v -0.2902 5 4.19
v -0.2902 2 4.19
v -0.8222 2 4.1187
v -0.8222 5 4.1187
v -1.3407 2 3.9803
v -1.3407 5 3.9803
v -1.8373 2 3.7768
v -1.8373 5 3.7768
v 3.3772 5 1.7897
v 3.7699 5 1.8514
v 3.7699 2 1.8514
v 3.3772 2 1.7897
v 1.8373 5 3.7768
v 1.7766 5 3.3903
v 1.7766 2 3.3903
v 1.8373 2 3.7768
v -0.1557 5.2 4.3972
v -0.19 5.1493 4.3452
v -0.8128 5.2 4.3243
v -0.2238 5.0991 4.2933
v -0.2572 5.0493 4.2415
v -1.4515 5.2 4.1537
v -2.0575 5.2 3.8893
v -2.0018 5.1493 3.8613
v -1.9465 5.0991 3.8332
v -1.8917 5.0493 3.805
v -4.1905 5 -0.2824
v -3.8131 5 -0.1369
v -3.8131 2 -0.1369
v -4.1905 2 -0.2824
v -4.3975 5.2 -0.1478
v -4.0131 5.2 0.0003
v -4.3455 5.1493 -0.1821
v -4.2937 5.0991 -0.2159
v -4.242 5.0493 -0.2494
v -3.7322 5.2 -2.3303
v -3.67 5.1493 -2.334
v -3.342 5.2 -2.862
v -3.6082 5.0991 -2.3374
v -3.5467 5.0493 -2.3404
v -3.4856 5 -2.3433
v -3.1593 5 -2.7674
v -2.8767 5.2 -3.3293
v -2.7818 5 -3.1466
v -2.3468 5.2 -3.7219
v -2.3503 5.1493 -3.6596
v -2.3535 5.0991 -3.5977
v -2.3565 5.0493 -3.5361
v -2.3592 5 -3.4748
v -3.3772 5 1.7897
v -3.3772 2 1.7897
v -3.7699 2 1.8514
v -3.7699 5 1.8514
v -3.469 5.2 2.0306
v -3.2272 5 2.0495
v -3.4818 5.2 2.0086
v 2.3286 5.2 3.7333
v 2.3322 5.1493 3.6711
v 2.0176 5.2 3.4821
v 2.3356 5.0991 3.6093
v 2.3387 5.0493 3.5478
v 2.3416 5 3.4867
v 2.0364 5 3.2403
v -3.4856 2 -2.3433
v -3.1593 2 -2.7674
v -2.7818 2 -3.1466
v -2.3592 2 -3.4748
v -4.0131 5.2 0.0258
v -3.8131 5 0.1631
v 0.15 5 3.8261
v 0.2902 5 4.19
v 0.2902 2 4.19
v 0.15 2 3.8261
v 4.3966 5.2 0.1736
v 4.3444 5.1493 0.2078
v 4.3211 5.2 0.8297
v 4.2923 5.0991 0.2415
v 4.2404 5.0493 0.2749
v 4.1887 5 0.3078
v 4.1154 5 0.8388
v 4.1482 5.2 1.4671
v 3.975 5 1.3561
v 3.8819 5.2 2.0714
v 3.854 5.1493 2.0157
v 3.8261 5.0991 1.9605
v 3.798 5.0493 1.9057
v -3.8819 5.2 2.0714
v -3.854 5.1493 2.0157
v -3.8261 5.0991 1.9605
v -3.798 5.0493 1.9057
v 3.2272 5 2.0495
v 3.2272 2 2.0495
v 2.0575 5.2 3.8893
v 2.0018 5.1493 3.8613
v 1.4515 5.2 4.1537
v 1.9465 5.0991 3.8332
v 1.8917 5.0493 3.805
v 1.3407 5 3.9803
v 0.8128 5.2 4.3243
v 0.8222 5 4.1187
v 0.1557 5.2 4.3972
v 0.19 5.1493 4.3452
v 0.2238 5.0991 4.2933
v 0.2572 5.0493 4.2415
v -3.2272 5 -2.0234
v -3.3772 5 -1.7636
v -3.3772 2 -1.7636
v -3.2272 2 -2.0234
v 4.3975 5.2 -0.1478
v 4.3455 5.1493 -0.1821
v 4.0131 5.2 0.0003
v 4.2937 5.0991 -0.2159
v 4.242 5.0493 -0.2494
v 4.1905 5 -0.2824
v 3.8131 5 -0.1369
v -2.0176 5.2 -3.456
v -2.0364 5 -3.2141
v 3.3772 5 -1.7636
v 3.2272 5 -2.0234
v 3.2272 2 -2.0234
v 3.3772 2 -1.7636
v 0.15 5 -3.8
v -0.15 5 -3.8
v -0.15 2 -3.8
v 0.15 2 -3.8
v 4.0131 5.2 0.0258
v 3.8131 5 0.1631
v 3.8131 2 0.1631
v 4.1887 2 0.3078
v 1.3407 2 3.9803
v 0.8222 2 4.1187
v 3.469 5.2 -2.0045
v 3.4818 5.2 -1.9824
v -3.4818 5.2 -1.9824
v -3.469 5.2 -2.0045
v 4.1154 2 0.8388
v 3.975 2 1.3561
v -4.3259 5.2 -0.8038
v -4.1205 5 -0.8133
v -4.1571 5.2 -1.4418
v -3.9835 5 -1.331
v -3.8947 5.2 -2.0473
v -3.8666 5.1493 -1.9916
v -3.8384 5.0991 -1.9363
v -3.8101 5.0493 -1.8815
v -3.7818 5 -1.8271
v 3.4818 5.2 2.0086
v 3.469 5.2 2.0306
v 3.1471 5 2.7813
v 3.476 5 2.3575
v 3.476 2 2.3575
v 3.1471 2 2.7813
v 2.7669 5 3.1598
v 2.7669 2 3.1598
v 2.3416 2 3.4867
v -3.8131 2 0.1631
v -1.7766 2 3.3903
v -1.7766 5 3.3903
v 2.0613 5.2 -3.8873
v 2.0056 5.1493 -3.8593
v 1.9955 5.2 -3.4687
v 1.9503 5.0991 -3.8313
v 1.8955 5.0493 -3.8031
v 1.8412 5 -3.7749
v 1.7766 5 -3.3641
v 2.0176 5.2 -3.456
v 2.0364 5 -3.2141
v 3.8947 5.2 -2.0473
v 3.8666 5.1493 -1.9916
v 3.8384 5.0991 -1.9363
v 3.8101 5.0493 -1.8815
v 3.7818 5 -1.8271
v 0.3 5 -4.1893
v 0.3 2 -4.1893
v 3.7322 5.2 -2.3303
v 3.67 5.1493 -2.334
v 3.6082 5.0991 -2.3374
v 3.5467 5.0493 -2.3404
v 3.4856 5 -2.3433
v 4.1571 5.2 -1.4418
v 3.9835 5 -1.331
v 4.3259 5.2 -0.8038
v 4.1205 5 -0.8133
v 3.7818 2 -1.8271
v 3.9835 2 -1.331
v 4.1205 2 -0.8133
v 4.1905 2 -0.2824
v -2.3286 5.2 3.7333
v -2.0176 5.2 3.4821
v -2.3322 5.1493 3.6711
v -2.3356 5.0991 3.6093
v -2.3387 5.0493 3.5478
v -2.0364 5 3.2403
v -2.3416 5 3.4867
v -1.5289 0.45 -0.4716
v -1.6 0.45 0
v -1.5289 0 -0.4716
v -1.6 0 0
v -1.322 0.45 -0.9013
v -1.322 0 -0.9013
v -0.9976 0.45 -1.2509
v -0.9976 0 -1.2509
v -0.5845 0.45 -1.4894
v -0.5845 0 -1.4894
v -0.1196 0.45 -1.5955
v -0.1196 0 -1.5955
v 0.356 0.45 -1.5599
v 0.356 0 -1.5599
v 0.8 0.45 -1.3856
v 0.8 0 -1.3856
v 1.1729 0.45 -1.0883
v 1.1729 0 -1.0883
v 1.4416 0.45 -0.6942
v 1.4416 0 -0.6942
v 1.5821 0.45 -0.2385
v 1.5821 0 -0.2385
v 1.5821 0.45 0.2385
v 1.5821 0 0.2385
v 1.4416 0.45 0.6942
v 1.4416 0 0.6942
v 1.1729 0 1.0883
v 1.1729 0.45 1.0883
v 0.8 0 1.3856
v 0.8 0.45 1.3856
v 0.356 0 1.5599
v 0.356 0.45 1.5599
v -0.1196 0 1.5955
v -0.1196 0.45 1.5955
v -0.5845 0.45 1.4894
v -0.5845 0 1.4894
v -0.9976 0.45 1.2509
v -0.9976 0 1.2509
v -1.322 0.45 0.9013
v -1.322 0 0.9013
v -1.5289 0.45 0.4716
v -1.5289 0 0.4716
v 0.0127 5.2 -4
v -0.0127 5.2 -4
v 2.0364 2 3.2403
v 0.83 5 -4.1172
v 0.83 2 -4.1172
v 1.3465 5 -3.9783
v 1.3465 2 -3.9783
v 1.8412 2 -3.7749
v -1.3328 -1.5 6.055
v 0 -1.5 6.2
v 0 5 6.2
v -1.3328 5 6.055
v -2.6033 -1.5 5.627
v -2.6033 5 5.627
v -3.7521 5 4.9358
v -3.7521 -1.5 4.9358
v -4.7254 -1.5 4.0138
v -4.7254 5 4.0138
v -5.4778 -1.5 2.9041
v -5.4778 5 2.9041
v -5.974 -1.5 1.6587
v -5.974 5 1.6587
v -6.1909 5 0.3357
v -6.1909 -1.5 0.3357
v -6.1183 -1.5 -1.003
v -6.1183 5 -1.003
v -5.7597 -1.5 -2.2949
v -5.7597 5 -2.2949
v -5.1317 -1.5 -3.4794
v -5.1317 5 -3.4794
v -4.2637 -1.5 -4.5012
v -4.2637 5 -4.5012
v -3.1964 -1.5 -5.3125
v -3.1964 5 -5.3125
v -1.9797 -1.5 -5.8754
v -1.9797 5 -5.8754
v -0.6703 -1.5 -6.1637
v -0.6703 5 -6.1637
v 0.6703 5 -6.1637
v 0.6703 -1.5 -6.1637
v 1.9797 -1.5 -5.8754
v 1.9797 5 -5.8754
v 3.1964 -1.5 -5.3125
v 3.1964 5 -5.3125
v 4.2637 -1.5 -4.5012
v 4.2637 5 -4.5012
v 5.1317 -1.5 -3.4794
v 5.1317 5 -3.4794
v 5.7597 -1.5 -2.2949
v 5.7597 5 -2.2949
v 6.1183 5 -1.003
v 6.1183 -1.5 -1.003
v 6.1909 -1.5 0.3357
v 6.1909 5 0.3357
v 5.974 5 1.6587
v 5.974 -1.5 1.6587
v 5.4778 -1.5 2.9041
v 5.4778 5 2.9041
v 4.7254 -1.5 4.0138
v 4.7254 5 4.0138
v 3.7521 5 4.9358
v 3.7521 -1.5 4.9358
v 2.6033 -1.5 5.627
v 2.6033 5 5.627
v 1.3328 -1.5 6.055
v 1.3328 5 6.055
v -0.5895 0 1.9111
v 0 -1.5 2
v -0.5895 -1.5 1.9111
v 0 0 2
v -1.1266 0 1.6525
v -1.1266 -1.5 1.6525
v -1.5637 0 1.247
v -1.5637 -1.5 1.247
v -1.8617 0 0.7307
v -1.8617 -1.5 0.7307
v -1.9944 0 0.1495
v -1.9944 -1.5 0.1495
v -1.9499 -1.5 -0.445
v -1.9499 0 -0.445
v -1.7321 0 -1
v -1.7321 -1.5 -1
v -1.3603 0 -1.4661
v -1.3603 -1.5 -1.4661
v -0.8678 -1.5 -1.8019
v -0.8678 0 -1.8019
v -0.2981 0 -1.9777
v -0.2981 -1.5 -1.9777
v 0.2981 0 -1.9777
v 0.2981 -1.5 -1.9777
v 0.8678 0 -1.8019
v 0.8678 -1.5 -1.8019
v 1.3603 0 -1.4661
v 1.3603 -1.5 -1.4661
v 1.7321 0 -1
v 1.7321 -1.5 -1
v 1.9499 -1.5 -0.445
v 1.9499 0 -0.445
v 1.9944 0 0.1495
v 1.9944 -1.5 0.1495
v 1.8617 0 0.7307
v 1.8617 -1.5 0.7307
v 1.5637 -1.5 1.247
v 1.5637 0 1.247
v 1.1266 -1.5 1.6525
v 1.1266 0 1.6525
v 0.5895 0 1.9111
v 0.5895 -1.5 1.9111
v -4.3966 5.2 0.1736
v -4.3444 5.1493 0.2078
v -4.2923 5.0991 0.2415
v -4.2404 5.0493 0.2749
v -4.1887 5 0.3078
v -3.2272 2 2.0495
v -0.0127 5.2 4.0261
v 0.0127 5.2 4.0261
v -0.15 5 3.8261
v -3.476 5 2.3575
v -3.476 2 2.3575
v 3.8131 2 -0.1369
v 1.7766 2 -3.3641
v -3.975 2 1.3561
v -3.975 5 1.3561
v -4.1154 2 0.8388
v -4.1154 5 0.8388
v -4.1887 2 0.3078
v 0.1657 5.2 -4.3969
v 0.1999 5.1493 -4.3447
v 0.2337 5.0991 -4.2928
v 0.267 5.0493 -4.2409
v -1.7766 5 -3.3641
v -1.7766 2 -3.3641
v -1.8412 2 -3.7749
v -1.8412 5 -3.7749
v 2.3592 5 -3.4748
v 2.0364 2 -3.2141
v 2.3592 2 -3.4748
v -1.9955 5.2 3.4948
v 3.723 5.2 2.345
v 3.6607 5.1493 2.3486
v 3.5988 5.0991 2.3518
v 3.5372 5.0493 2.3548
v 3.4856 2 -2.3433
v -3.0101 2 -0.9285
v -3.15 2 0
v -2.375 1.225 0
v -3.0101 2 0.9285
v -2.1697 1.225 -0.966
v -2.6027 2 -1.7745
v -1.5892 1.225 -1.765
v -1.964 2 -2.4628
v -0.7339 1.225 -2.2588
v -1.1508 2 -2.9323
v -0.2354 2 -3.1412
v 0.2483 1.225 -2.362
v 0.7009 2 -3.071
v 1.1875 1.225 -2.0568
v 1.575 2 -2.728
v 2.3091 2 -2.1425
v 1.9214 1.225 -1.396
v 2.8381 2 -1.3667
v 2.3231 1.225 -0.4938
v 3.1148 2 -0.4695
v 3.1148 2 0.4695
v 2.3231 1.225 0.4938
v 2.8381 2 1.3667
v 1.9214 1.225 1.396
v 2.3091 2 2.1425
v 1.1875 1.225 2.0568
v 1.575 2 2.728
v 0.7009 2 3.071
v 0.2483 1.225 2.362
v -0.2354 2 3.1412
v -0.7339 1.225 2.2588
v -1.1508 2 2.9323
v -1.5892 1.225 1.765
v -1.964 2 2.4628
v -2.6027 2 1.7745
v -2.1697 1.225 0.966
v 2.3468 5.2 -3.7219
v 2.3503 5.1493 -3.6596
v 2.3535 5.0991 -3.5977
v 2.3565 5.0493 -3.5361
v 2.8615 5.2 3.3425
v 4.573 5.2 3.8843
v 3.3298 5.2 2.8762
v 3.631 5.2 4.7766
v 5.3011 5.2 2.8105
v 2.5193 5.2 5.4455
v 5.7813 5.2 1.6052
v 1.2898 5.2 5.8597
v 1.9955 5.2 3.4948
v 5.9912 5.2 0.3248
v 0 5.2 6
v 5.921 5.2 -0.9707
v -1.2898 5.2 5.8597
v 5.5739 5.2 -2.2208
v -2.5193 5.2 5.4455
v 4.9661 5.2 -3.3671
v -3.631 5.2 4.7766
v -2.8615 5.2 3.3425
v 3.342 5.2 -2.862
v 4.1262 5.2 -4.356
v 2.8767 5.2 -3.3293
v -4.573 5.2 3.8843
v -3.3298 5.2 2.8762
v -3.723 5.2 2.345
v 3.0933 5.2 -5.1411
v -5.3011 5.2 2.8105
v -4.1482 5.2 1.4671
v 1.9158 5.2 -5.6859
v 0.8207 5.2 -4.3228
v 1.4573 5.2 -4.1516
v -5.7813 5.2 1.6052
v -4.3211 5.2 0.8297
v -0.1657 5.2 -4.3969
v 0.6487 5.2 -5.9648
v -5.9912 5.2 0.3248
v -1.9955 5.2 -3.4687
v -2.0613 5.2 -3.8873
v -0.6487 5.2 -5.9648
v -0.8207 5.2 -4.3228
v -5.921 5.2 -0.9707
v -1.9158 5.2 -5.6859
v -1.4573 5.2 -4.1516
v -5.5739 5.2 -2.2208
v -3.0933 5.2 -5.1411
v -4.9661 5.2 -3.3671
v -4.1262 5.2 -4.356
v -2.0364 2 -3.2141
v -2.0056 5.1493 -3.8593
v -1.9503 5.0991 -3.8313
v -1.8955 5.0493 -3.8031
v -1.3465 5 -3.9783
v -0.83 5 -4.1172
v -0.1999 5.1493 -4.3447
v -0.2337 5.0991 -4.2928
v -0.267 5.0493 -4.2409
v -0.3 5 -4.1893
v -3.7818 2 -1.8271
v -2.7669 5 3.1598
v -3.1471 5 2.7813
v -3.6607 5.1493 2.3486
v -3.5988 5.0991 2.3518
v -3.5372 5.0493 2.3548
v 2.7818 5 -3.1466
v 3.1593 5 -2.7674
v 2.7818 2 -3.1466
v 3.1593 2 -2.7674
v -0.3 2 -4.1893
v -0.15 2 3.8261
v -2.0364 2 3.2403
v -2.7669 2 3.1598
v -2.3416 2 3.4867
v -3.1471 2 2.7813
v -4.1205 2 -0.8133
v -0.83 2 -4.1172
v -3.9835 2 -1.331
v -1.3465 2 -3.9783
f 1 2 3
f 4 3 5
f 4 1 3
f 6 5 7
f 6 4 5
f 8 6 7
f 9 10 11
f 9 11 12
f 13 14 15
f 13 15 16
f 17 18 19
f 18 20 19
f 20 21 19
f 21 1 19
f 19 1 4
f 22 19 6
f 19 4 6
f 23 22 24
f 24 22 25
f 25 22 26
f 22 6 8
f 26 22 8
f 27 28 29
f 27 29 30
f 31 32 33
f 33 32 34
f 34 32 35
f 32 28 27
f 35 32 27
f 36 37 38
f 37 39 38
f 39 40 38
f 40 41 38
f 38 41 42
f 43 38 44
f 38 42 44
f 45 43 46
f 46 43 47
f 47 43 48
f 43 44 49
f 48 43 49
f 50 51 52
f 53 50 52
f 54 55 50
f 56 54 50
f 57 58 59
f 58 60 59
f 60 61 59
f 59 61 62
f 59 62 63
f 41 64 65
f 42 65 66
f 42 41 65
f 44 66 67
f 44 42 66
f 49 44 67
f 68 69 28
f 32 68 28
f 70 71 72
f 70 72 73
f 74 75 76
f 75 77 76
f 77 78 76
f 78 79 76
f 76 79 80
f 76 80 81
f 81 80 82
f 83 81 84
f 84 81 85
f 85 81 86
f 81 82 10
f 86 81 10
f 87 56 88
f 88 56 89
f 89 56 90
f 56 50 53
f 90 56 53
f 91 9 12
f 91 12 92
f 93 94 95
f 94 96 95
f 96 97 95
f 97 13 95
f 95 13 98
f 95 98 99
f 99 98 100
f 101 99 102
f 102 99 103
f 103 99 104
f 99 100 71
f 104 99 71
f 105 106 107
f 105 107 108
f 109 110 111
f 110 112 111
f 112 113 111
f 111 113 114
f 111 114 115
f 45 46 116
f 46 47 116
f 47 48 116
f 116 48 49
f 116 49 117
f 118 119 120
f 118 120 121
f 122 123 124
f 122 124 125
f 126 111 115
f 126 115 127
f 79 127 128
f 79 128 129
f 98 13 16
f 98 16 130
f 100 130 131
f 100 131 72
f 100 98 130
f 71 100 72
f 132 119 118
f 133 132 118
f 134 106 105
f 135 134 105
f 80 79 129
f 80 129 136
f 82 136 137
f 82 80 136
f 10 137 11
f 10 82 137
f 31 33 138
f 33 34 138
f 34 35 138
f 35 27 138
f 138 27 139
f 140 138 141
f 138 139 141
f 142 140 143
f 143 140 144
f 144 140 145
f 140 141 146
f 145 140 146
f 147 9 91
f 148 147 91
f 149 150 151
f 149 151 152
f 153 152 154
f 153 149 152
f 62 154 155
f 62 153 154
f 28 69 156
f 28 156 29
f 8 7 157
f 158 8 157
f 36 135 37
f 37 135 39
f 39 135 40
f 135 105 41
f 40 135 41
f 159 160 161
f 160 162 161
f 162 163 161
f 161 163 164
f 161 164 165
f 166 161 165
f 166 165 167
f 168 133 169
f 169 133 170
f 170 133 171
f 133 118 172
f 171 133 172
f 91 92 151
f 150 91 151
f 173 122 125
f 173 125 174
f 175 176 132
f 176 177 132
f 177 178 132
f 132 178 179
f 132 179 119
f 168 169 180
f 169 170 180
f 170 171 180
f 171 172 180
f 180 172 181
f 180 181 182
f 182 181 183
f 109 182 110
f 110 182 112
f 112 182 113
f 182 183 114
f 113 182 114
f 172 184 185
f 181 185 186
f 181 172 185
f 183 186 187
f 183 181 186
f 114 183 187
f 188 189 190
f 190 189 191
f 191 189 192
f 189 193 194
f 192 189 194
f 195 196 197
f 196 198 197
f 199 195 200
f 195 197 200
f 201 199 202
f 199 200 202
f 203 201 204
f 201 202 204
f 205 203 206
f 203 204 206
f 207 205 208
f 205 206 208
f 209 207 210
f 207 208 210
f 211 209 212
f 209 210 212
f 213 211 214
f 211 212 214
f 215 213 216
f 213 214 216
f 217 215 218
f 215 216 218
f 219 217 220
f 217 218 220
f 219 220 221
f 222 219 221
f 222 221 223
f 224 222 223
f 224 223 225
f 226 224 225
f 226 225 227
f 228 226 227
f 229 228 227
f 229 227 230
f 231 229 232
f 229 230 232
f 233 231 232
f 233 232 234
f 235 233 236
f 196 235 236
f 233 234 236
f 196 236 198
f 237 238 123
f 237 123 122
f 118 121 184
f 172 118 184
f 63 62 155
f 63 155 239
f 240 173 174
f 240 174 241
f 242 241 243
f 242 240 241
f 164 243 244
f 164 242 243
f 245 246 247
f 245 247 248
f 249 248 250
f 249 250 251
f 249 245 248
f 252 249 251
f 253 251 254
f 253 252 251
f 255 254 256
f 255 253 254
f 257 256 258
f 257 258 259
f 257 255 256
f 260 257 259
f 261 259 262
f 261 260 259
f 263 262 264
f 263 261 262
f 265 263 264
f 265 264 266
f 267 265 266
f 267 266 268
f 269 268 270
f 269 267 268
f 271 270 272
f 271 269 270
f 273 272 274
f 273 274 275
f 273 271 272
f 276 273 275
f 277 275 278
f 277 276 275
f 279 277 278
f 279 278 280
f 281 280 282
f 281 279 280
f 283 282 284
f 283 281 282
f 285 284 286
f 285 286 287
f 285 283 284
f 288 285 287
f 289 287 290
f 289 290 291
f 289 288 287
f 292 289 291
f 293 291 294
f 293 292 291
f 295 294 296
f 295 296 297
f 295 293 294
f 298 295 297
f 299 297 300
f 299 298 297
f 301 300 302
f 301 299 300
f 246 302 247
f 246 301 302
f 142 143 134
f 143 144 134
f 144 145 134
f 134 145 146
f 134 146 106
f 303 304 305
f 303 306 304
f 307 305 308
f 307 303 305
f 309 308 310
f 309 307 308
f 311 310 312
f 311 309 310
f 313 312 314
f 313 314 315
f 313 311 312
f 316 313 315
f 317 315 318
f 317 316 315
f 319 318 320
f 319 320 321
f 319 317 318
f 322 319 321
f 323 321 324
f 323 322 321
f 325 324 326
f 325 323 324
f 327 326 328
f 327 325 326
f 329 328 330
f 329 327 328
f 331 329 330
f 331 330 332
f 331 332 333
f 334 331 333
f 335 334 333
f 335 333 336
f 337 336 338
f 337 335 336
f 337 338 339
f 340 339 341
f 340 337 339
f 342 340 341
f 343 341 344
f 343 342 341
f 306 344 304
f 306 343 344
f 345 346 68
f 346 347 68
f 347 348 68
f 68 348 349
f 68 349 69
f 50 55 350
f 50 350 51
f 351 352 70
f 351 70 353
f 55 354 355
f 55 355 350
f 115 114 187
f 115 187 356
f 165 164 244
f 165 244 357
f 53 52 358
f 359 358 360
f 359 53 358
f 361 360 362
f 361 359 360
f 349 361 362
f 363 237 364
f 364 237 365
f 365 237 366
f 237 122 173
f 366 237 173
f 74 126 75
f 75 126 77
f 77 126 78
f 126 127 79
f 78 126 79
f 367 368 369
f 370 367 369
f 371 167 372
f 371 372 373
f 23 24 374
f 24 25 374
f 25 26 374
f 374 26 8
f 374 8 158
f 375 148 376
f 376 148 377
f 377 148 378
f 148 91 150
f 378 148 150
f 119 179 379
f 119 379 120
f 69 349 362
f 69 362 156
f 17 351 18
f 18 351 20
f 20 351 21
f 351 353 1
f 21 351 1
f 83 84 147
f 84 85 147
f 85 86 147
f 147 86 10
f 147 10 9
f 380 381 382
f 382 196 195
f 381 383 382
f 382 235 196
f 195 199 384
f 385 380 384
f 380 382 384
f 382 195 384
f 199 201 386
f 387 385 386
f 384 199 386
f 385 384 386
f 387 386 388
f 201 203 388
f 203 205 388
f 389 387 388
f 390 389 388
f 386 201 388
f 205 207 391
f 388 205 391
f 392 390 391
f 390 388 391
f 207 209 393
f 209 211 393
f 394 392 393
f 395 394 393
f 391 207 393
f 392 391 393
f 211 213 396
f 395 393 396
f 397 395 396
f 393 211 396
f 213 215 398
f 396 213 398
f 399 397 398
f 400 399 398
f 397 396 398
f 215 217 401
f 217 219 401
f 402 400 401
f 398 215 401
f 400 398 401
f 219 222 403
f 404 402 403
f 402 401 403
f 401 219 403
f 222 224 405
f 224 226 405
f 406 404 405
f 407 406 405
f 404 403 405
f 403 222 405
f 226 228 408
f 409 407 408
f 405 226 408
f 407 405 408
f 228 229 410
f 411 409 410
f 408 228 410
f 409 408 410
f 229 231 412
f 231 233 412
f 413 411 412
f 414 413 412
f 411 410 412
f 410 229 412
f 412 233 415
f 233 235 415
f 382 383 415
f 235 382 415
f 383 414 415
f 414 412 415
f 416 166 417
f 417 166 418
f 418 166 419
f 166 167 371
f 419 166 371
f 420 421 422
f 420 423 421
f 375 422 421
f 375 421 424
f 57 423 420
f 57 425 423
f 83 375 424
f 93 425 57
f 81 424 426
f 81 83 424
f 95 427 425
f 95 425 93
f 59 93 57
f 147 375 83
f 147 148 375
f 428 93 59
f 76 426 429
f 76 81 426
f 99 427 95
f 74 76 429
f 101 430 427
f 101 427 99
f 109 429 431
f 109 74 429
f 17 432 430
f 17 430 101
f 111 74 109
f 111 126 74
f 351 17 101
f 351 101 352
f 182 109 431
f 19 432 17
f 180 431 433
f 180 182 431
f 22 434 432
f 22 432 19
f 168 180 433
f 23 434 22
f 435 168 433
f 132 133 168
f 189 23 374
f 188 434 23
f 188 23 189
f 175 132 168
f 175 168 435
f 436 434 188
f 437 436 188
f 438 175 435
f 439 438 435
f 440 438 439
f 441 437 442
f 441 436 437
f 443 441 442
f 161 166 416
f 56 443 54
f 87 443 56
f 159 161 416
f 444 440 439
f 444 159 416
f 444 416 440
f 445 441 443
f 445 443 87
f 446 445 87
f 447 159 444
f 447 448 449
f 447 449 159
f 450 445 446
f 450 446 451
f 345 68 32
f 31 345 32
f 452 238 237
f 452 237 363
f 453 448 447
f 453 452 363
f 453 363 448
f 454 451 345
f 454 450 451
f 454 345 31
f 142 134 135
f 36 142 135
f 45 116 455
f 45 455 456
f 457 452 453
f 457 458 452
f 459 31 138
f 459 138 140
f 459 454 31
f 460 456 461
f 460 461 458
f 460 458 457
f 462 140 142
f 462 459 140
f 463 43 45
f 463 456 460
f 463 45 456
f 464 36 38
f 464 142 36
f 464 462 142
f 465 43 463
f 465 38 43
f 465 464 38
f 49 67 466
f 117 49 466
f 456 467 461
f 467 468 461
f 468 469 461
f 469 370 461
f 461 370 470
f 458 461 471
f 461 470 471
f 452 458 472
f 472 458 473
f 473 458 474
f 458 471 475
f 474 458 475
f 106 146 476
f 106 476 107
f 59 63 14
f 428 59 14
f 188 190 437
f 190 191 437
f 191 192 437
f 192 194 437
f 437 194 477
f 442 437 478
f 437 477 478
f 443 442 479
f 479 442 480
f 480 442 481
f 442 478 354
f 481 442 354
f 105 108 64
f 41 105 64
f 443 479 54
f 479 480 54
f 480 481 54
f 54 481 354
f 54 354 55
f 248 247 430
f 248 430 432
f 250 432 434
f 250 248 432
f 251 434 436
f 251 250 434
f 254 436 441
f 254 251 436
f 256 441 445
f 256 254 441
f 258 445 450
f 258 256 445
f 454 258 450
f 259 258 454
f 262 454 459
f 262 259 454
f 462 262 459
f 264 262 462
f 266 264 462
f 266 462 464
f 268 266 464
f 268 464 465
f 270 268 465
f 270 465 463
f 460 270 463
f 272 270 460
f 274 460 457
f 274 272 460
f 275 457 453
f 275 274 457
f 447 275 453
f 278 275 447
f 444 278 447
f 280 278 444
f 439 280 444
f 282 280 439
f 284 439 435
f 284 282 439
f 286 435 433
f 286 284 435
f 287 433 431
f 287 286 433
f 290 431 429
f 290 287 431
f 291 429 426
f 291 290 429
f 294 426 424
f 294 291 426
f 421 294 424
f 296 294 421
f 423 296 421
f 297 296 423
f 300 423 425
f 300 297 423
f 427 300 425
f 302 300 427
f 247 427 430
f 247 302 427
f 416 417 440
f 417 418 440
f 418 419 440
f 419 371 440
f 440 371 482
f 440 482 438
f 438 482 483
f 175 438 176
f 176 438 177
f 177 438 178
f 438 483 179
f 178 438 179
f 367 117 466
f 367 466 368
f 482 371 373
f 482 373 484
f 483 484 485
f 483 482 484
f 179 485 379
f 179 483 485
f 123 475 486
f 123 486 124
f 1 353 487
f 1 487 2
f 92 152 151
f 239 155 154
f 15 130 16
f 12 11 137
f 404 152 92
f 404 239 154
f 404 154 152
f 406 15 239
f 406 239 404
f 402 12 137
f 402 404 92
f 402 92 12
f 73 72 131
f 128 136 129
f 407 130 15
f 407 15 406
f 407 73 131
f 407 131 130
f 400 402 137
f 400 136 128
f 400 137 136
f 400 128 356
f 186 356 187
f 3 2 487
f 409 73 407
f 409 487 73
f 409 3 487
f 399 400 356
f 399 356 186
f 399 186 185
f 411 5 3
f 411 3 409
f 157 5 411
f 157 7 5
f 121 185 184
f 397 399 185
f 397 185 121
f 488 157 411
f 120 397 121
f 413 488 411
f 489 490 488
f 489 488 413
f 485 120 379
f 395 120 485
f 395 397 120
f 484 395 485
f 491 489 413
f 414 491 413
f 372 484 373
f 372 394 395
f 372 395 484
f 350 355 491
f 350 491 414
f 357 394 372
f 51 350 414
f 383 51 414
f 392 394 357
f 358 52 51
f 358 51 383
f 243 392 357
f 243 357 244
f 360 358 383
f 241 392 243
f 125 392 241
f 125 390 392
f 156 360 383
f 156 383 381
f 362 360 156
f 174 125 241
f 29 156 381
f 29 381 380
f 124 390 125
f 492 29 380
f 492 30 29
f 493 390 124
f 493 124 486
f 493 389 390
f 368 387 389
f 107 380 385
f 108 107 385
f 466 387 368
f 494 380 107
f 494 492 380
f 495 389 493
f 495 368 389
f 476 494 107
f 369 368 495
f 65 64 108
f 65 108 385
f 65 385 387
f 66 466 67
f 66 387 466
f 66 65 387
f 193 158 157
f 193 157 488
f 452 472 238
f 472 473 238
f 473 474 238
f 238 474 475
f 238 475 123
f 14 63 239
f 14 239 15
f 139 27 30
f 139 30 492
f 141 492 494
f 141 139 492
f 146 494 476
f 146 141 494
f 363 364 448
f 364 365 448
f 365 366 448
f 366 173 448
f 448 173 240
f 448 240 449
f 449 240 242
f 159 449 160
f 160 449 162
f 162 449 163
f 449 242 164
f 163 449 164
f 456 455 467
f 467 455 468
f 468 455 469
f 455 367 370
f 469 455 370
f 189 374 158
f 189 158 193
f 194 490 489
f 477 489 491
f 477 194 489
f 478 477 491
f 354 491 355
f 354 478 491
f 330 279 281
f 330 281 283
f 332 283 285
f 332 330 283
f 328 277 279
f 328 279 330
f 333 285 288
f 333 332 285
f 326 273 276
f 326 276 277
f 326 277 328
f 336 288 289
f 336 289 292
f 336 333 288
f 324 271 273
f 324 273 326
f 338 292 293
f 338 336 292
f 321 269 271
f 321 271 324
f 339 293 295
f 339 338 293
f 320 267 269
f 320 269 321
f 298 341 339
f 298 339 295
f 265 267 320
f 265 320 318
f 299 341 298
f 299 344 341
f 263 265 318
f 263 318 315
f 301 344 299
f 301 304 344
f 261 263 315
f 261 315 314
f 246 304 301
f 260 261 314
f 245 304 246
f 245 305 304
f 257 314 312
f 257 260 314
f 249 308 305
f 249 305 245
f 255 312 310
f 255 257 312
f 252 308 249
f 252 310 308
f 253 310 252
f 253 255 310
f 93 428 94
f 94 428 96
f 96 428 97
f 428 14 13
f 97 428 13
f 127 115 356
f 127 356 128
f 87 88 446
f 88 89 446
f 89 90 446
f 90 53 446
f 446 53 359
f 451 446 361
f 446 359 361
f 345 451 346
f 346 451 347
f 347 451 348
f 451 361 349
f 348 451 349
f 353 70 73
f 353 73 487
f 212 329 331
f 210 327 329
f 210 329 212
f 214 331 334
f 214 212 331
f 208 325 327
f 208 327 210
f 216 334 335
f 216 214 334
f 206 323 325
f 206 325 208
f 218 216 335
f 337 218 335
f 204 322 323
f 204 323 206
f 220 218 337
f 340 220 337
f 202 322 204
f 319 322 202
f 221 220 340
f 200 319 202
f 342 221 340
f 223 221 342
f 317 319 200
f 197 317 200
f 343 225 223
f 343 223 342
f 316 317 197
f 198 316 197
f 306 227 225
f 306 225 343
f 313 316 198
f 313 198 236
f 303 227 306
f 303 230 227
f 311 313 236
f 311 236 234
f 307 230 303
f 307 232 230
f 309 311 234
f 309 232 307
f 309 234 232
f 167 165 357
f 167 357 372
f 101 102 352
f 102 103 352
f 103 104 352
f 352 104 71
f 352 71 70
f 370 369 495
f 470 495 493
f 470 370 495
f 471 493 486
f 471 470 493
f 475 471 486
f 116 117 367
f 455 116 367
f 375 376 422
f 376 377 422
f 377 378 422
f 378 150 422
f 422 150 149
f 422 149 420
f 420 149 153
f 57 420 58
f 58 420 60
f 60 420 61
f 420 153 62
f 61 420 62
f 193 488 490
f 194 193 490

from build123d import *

# Parameters (mm, degrees)
EXTRUDE_1_REACH              = 13.035
PATTERN_CIRCULAR_1_COUNT     = 12
CHAMFER_1_SIZE               = 0.2
HOLE_WIZARD_M3_1_D           = 3.2
HOLE_WIZARD_M3_1_DEPTH       = 10
HOLE_WIZARD_M3_1_CSINK_D     = 6.3
HOLE_WIZARD_M3_1_CSINK_ANGLE = 90
HOLE_WIZARD_M3_1_TIP         = 0.96137699


with BuildPart() as part:
    # 草图1 → 旋转1 (revolve)
    with BuildSketch(Plane.XY, mode=Mode.PRIVATE) as revolve_1_sk:
        Polygon((0, 2), (4.2, 2), (4.2, 5.2), (6.2, 5.2), (6.2, -1.5), (2, -1.5), (2, 0), (0, 0), align=None)
    revolve(revolve_1_sk.sketch.rotate(Axis((0, 0, 0), (0, -1, 0)), 90), axis=Axis((0, 0, 0), (0, -1, 0)))

    # 草图6 → 凸台-拉伸1 (add, up to next)
    with BuildSketch(Plane(origin=(0, 5.2, 0), x_dir=(1, 0, 0), z_dir=(0, 1, 0)), mode=Mode.PRIVATE) as extrude_1_sk1:
        with BuildLine():
            Line((-0.3, 4.189272013), (-0.15, 3.8))
            Line((-0.15, 3.8), (0.15, 3.8))
            Line((0.15, 3.8), (0.3, 4.189272013))
            ThreePointArc((0.3, 4.189272013), (0, 4.2), (-0.3, 4.189272013))
        make_face()
    extrude_1_tool1 = extrude(extrude_1_sk1.sketch, amount=-EXTRUDE_1_REACH, mode=Mode.PRIVATE) - part.part
    extrude_1 = extrude_1_tool1.solids().sort_by_distance((0, 5.2, -4.020503))[0]
    add(extrude_1)

    # 阵列(圆周)1: 凸台-拉伸1 ×12 about axis
    pattern_circular_1_axis = Axis((0, 0, 0.0130623), (0, 1, 0))
    for i in range(1, PATTERN_CIRCULAR_1_COUNT):
        add(extrude_1.rotate(pattern_circular_1_axis, i * 360 / PATTERN_CIRCULAR_1_COUNT))

    # 倒角1
    chamfer_1_edges = [part.edges().sort_by_distance(p)[0] for p in [
        (-0.220099646, 5.2, 4.008043467),
        (0.220099646, 5.2, 4.008043467),
        (0, 5.2, 3.8261246),
        (2.963047356, 5.2, 2.976634066),
        (1.806983311, 5.2, 3.583533316),
        (2.188995086, 5.2, 3.363488592),
        (1.90653115, 5.2, 3.315271118),
        (4.053472149, 5.2, 1.099710659),
        (3.351583041, 5.2, 2.2034896),
        (3.573571791, 5.2, 1.820532654),
        (3.302208818, 5.2, 1.91959345),
        (4.060265001, 5.2, -1.0743594),
        (4.000883833, 5.2, 0.235436447),
        (4.001779561, 5.2, -0.209657003),
        (3.8130623, 5.2, 0.0130623),
        (2.976633055, 5.2, -2.963048372),
        (3.579482315, 5.2, -1.795336429),
        (3.356386981, 5.2, -2.183312937),
        (3.302208818, 5.2, -1.89346885),
        (1.090435686, 5.2, -4.055977073),
        (2.197803646, 5.2, -3.344478358),
        (1.808889205, 5.2, -3.569542645),
        (1.90653115, 5.2, -3.289146518),
        (-1.090435686, 5.2, -4.055977073),
        (-0.225, 5.2, -3.994636007),
        (0, 5.2, -3.8),
        (0.225, 5.2, -3.994636007),
        (-2.976633055, 5.2, -2.963048372),
        (-1.808889205, 5.2, -3.569542645),
        (-2.197803646, 5.2, -3.344478358),
        (-1.90653115, 5.2, -3.289146518),
        (-4.060265001, 5.2, -1.0743594),
        (-3.356386981, 5.2, -2.183312937),
        (-3.579482315, 5.2, -1.795336429),
        (-3.302208818, 5.2, -1.89346885),
        (-4.053472149, 5.2, 1.099710659),
        (-4.001779561, 5.2, -0.209657003),
        (-4.000883833, 5.2, 0.235436447),
        (-3.8130623, 5.2, 0.0130623),
        (-2.963047356, 5.2, 2.976634066),
        (-3.573571791, 5.2, 1.820532654),
        (-3.351583041, 5.2, 2.2034896),
        (-3.302208818, 5.2, 1.91959345),
        (0, 5.2, -6.2),
        (-1.083642839, 5.2, 4.05779721),
        (-2.188995086, 5.2, 3.363488592),
        (-1.806983311, 5.2, 3.583533316),
        (-1.90653115, 5.2, 3.315271118),
        (1.083642839, 5.2, 4.05779721),
    ]]
    chamfer(chamfer_1_edges, length=CHAMFER_1_SIZE)

    # M3 平头机械螺钉的锥形沉头孔1
    with Locations(Plane(origin=(0, 2, 0), x_dir=(1, 0, 0), z_dir=(0, 1, 0))):
        with Locations((0, 0)):
            CounterSinkHole(HOLE_WIZARD_M3_1_D / 2, HOLE_WIZARD_M3_1_CSINK_D / 2, depth=HOLE_WIZARD_M3_1_DEPTH, counter_sink_angle=HOLE_WIZARD_M3_1_CSINK_ANGLE)
            with Locations((0, 0, -(HOLE_WIZARD_M3_1_DEPTH + HOLE_WIZARD_M3_1_TIP / 2))):  # 118° drill point
                Cone(0, HOLE_WIZARD_M3_1_D / 2, HOLE_WIZARD_M3_1_TIP, mode=Mode.SUBTRACT)


solid = part.part
